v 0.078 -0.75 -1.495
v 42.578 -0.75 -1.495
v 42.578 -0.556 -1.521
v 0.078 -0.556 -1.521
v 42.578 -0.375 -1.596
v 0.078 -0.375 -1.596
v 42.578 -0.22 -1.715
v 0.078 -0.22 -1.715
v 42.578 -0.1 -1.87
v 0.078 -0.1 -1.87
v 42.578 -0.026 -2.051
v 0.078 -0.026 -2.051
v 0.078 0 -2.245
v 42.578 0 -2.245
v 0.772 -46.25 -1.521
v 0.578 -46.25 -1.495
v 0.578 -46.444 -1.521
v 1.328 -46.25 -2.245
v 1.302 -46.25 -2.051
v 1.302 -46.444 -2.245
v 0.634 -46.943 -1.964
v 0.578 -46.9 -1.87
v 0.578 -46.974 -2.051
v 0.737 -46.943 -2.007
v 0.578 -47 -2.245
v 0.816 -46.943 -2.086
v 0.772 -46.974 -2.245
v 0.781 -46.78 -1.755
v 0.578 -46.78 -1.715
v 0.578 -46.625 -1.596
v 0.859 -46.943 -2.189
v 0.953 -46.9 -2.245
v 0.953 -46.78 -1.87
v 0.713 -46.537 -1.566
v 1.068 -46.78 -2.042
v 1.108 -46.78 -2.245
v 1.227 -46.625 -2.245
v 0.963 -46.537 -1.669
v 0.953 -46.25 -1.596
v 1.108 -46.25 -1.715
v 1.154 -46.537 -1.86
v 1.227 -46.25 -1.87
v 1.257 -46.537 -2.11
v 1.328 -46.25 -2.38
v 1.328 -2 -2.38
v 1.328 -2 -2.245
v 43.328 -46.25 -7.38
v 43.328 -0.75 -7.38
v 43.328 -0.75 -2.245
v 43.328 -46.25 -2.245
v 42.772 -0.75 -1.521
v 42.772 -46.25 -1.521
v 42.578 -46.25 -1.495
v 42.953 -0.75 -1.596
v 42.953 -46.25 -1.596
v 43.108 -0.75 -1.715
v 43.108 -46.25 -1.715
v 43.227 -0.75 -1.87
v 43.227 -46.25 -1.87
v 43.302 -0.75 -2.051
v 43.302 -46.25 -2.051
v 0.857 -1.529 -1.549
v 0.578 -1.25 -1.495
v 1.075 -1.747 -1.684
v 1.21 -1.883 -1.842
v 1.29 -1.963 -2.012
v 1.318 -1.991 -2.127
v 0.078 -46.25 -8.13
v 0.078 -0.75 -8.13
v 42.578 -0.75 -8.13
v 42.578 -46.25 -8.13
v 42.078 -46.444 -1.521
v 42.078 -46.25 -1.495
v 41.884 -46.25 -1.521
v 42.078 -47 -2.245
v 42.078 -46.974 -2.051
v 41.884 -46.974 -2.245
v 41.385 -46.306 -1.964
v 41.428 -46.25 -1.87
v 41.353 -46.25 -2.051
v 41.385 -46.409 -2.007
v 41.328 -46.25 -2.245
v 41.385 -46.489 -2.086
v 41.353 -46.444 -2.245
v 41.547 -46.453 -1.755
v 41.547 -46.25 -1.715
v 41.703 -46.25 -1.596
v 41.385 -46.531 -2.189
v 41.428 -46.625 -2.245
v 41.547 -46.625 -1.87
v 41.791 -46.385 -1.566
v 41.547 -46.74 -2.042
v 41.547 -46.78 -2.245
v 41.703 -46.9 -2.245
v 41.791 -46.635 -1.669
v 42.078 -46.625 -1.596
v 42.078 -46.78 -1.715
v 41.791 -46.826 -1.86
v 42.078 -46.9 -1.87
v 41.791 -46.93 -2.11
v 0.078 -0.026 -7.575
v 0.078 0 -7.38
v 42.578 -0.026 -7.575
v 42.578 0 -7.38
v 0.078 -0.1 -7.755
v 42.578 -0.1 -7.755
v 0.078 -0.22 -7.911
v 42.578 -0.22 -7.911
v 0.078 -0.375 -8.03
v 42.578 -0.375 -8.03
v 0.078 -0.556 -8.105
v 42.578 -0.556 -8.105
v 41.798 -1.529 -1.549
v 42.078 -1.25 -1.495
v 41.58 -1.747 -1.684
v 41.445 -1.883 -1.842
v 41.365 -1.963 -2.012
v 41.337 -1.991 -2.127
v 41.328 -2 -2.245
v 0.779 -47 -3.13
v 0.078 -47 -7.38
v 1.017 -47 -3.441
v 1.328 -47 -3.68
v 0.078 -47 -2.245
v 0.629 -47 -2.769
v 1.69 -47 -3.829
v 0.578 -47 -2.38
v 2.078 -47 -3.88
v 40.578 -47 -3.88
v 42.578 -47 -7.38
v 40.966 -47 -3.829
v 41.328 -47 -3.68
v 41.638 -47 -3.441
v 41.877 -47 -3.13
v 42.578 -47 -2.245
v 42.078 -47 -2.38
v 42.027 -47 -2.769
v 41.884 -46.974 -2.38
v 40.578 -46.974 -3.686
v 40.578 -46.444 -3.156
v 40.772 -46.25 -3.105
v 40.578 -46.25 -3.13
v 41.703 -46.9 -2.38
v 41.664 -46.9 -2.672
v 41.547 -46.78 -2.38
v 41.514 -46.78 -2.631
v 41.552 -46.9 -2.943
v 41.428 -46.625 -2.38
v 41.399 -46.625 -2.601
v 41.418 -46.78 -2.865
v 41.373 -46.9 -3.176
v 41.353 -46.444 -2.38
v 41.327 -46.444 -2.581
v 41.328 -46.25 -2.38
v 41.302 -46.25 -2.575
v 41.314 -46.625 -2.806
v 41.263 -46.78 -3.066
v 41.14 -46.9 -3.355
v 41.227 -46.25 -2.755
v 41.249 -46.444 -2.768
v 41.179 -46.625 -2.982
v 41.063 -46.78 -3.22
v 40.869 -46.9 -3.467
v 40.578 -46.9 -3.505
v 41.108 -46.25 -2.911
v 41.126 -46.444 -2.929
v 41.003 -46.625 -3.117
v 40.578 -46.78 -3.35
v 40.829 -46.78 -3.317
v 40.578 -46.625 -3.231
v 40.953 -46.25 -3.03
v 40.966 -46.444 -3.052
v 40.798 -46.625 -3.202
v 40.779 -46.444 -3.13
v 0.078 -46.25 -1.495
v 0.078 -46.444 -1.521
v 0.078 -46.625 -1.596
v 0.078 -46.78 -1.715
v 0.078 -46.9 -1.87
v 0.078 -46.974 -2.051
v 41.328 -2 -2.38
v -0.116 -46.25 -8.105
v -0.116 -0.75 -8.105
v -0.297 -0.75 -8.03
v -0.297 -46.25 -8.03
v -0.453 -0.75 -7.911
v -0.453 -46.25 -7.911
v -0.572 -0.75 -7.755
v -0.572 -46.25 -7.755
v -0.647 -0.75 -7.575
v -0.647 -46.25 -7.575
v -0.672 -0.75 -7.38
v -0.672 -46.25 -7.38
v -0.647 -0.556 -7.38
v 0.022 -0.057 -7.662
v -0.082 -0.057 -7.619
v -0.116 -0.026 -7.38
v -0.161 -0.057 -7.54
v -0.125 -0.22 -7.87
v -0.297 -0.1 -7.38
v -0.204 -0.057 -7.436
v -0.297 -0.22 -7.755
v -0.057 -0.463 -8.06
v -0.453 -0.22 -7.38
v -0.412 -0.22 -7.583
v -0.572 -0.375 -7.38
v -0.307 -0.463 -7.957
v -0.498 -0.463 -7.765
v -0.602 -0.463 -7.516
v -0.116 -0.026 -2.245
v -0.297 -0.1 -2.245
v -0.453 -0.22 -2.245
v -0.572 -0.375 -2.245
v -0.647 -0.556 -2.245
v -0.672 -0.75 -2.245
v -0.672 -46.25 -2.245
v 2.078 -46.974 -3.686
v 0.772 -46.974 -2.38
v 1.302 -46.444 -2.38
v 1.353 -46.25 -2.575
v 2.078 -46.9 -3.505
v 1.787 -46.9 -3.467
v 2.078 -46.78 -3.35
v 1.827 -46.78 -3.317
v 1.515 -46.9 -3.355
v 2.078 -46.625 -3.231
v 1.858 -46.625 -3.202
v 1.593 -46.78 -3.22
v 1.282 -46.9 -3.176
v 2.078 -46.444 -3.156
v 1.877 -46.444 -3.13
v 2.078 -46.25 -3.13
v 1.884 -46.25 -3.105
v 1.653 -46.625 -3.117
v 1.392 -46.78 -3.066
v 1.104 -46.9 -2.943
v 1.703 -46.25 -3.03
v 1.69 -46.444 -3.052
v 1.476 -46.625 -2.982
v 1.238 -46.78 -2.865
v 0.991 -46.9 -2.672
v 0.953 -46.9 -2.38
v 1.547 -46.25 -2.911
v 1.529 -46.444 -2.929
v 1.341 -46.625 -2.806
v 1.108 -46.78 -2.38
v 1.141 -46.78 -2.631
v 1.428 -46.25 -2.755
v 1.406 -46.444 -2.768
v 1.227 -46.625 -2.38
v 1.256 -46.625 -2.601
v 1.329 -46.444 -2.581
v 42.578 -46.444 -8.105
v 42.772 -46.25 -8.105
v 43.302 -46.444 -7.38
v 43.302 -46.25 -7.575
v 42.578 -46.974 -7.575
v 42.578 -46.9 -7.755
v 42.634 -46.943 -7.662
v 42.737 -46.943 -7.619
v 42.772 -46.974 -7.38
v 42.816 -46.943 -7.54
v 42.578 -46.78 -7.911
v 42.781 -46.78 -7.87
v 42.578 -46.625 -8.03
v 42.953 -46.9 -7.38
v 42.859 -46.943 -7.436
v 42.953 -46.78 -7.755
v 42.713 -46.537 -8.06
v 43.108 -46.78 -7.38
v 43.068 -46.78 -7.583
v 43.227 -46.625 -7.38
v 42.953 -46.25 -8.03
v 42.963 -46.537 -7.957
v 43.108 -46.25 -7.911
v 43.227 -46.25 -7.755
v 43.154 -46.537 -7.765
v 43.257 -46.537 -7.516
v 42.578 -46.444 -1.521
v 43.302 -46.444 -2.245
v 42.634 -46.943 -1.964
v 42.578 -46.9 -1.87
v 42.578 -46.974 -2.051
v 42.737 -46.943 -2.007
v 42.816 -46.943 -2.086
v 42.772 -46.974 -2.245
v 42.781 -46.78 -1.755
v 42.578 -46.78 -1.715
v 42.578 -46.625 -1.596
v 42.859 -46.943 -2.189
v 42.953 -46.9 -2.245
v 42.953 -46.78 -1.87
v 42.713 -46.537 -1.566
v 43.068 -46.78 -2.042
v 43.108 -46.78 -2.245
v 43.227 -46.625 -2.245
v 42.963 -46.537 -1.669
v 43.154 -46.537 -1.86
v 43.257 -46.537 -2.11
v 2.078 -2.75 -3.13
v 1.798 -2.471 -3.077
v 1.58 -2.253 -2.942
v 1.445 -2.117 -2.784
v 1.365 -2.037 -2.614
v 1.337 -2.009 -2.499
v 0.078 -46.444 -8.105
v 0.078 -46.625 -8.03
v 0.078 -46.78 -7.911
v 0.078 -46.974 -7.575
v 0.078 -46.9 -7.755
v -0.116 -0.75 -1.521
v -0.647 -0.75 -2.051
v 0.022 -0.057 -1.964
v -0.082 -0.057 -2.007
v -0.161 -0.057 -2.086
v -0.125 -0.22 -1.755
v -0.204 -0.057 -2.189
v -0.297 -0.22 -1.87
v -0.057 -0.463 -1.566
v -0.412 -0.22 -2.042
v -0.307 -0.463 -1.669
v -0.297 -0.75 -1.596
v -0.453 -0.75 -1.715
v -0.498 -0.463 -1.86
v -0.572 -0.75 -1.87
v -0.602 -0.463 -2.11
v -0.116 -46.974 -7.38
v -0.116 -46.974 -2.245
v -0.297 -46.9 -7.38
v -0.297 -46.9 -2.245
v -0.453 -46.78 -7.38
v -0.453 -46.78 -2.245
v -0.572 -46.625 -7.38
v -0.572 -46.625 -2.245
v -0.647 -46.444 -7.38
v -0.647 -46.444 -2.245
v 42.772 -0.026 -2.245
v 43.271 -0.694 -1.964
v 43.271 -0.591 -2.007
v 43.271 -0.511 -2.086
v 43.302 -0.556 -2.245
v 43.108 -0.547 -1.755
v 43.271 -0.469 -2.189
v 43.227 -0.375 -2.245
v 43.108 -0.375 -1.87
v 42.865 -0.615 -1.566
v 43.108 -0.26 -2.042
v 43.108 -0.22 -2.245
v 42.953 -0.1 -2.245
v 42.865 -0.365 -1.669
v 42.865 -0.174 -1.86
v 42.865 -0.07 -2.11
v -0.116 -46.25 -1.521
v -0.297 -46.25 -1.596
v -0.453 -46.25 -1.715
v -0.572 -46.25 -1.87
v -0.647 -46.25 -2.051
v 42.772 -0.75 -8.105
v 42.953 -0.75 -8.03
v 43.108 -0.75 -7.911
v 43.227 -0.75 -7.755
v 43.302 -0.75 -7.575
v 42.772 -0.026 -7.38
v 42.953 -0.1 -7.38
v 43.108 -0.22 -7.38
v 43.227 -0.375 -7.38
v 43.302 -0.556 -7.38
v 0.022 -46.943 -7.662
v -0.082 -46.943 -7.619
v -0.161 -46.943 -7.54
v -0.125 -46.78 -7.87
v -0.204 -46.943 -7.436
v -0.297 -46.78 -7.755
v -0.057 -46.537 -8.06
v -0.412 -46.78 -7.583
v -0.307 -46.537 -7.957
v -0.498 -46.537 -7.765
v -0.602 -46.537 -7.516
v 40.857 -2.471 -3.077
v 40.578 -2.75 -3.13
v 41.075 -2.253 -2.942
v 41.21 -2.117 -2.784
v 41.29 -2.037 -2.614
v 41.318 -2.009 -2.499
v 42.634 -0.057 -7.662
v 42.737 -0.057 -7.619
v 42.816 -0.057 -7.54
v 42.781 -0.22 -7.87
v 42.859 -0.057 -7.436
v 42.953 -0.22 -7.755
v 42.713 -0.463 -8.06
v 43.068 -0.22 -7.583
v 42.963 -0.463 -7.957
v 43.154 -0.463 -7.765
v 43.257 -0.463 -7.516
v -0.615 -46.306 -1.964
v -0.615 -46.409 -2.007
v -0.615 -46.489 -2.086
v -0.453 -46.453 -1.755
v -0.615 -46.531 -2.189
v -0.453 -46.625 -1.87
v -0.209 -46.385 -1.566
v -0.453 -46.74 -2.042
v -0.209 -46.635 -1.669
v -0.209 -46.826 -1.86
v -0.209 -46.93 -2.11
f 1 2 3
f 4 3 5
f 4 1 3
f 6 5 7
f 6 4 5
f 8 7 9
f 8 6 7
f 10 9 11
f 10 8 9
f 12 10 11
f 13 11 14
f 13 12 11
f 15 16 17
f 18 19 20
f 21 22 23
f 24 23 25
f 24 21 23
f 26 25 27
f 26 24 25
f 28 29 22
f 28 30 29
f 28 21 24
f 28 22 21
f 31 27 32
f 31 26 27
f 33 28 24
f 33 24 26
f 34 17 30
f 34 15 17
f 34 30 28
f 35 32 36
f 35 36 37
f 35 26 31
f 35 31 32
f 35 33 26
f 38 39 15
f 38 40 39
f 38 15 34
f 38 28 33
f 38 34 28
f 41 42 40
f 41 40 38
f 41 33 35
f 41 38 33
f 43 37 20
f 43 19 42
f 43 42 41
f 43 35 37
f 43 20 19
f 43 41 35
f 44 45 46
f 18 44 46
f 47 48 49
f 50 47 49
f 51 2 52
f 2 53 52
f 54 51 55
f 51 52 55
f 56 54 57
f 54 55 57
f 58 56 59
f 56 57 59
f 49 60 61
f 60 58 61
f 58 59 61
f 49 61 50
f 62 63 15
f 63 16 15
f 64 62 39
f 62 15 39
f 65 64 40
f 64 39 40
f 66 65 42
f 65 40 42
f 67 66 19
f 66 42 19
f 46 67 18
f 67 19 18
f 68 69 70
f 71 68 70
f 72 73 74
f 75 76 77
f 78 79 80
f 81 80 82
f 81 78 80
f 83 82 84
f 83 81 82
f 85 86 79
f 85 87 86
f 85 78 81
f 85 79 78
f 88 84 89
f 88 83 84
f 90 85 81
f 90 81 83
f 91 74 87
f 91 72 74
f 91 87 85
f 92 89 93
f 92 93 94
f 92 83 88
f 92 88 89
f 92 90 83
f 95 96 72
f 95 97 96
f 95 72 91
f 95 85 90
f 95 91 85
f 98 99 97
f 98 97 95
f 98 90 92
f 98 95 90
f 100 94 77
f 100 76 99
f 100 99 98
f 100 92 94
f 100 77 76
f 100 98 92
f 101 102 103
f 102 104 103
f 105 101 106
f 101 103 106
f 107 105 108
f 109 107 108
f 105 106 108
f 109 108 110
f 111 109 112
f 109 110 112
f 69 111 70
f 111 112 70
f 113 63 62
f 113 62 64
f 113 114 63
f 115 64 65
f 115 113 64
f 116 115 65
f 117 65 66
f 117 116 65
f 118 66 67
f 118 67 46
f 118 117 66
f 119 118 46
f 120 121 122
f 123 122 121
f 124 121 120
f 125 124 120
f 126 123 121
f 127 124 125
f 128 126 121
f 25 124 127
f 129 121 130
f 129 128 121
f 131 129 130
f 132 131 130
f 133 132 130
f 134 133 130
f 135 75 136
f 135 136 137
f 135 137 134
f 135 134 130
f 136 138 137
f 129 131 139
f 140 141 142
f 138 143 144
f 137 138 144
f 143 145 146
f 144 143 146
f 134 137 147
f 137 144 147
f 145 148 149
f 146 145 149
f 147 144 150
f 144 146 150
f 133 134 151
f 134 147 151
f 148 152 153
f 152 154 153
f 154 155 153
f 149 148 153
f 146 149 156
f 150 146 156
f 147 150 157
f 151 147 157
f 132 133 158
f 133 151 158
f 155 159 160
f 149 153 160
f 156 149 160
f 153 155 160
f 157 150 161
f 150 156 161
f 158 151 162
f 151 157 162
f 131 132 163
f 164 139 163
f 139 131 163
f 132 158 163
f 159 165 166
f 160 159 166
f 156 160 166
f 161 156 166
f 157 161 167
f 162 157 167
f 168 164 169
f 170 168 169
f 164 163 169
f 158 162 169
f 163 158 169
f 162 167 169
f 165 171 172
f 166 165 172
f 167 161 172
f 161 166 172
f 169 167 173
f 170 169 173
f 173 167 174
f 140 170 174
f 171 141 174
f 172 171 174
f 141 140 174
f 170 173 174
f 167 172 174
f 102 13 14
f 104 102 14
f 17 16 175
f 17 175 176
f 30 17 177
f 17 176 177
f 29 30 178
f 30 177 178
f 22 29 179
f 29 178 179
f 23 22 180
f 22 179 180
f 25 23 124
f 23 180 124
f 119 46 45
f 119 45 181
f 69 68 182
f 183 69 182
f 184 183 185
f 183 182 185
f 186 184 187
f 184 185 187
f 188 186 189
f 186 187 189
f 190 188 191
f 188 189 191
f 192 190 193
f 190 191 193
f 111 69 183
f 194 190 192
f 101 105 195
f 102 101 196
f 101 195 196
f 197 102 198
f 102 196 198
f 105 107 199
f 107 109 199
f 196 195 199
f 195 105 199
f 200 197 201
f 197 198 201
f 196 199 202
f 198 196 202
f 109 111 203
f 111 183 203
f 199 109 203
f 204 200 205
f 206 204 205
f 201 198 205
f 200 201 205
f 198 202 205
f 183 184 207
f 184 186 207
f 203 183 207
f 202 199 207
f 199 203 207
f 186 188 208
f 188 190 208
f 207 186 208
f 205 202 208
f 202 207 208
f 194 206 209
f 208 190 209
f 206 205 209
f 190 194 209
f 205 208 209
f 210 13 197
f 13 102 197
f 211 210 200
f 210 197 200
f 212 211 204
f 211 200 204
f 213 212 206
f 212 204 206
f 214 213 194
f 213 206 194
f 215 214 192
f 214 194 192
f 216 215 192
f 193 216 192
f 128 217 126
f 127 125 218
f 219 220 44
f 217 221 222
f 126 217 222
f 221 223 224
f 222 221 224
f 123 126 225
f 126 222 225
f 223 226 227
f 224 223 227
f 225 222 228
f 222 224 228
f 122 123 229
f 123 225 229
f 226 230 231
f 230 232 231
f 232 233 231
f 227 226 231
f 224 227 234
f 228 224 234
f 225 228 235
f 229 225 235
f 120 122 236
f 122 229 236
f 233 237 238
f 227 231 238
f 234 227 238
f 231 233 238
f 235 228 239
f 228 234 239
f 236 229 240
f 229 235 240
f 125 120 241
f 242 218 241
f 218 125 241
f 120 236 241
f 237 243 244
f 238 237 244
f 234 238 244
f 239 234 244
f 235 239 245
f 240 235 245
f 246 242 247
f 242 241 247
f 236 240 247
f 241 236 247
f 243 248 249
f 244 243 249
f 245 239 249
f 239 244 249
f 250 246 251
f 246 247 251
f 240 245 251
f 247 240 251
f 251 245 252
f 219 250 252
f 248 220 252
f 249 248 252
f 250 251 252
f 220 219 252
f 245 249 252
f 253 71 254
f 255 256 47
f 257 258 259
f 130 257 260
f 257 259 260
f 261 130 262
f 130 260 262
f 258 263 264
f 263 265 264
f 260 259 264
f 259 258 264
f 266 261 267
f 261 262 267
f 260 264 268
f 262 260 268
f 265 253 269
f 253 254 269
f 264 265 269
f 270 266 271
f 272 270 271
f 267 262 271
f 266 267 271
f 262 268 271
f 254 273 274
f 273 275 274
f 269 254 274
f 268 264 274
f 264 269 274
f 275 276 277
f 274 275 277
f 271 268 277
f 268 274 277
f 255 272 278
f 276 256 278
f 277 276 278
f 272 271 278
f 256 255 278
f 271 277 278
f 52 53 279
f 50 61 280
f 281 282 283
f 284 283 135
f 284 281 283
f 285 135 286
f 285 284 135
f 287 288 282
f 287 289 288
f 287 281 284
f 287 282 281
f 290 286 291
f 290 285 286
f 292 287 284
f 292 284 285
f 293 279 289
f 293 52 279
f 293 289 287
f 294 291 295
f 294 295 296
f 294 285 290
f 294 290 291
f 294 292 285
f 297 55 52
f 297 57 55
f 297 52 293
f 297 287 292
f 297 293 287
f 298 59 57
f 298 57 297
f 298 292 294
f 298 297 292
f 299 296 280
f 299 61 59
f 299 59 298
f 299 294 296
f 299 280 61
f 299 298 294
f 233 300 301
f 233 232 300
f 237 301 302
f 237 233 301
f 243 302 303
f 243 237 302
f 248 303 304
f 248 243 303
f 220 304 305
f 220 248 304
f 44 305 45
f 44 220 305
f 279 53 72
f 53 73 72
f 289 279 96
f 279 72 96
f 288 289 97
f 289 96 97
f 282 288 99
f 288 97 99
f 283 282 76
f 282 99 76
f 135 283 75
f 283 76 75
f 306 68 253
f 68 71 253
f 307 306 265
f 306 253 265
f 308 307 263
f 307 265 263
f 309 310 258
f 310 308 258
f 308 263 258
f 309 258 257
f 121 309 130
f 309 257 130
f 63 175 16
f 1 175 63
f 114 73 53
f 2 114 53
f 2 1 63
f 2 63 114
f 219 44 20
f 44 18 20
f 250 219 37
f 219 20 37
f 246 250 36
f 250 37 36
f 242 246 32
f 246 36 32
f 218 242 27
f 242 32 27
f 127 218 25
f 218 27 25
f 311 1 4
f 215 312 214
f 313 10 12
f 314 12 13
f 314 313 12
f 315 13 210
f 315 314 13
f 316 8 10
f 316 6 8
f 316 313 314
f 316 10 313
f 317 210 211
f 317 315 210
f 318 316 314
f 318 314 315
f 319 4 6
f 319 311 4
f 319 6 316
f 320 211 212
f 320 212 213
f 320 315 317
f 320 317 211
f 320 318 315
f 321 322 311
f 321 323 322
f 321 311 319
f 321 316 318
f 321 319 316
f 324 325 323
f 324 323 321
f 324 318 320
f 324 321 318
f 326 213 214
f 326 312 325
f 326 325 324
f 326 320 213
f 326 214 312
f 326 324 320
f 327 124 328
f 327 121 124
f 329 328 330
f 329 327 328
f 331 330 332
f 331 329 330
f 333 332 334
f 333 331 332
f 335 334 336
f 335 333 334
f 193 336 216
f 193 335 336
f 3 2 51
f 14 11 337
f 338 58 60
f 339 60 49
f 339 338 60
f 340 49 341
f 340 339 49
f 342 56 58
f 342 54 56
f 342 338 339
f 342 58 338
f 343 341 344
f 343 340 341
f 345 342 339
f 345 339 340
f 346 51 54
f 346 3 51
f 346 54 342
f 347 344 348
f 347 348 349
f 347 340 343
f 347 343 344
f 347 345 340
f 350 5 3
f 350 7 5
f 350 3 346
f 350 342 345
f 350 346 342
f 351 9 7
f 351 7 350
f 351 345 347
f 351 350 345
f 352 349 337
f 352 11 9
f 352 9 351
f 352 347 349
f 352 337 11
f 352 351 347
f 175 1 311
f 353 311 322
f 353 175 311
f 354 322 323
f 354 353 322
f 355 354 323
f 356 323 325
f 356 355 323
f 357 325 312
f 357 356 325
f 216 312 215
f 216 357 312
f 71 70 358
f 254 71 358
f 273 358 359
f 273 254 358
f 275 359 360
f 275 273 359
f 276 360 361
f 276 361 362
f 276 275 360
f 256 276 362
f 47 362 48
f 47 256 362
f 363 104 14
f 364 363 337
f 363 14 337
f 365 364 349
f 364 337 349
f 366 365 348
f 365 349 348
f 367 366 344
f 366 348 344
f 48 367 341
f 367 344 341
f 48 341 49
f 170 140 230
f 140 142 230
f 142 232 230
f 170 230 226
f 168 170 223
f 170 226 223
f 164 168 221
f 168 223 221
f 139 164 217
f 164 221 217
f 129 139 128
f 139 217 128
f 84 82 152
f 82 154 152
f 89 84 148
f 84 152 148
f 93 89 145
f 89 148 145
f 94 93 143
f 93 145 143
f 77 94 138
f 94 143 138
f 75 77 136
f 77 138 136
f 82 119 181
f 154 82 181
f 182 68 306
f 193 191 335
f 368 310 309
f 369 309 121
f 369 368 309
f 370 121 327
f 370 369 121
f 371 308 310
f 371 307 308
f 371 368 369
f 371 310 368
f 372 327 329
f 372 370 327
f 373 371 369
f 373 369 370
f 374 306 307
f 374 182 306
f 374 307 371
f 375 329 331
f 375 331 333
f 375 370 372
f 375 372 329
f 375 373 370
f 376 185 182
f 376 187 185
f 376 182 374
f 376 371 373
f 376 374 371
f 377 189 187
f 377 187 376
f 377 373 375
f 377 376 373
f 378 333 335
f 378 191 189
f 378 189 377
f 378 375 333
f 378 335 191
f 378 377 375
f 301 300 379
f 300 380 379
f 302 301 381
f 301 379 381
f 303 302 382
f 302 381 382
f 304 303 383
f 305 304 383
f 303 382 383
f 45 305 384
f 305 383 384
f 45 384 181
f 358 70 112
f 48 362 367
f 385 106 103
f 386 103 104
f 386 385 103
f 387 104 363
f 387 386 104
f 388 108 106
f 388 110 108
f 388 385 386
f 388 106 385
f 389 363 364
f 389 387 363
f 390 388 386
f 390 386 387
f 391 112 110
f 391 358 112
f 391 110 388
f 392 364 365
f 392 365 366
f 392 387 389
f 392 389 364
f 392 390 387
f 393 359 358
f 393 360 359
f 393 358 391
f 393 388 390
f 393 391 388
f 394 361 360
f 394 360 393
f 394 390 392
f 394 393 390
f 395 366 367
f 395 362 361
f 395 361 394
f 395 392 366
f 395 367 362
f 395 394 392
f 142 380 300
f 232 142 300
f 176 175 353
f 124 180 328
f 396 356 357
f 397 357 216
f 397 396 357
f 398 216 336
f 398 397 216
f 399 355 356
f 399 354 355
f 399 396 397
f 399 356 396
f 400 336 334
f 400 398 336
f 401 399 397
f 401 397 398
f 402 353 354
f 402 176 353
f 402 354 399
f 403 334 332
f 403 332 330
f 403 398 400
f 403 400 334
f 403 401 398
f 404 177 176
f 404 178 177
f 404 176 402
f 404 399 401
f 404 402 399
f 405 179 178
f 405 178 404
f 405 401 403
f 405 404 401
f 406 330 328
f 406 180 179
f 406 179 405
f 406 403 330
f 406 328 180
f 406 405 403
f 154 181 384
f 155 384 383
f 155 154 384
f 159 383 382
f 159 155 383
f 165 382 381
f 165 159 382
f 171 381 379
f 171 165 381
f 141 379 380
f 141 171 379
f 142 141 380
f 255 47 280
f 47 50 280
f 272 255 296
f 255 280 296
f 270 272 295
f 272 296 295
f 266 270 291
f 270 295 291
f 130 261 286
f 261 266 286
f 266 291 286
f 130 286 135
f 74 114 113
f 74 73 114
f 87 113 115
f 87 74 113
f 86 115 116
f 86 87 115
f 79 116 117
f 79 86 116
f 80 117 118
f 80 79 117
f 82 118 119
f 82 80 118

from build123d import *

# Parameters (mm, degrees)
F1_DEPTH = 47
F0_W     = 40
F0_H     = 1.6352946644
F2_DEPTH = 2
F3_R     = 0.75


with BuildPart() as f1:
    # F0 (on Front) → F1 (new body)
    with BuildSketch(Plane.XZ):
        Polygon((-0.6722141189, -1.4952032847), (-0.6722141189, -8.1304979491), (43.3277858811, -8.1304979491), (43.3277858811, -1.4952032847), (41.3277858811, -1.4952032847), (41.3277858811, -3.1304979491), (1.3277858811, -3.1304979491), (1.3277858811, -1.4952032847), align=None)
    extrude(amount=F1_DEPTH)

    # F0 (on Front) → F2 (join)
    with BuildSketch(Plane.XZ):
        with Locations((21.3277858811, -2.3128506169)):
            Rectangle(F0_W, F0_H)
    extrude(amount=F2_DEPTH)

    # F3
    f3_edges = [f1.edges().sort_by_distance(p)[0] for p in [
        (1.327786, -24.5, -1.495203),
        (0.327786, -47, -1.495203),
        (-0.672214, -23.5, -1.495203),
        (21.327786, 0, -1.495203),
        (43.327786, -23.5, -1.495203),
        (42.327786, -47, -1.495203),
        (41.327786, -24.5, -1.495203),
        (21.327786, -2, -1.495203),
        (21.327786, -2, -3.130498),
        (1.327786, -24.5, -3.130498),
        (21.327786, -47, -3.130498),
        (41.327786, -24.5, -3.130498),
        (-0.672214, -23.5, -8.130498),
        (43.327786, -23.5, -8.130498),
        (21.327786, 0, -8.130498),
        (21.327786, -47, -8.130498),
        (-0.672214, 0, -4.812851),
        (43.327786, 0, -4.812851),
        (-0.672214, -47, -4.812851),
        (1.327786, -47, -2.312851),
        (43.327786, -47, -4.812851),
        (41.327786, -47, -2.312851),
    ]]
    fillet(f3_edges, radius=F3_R)


solid = f1.part
